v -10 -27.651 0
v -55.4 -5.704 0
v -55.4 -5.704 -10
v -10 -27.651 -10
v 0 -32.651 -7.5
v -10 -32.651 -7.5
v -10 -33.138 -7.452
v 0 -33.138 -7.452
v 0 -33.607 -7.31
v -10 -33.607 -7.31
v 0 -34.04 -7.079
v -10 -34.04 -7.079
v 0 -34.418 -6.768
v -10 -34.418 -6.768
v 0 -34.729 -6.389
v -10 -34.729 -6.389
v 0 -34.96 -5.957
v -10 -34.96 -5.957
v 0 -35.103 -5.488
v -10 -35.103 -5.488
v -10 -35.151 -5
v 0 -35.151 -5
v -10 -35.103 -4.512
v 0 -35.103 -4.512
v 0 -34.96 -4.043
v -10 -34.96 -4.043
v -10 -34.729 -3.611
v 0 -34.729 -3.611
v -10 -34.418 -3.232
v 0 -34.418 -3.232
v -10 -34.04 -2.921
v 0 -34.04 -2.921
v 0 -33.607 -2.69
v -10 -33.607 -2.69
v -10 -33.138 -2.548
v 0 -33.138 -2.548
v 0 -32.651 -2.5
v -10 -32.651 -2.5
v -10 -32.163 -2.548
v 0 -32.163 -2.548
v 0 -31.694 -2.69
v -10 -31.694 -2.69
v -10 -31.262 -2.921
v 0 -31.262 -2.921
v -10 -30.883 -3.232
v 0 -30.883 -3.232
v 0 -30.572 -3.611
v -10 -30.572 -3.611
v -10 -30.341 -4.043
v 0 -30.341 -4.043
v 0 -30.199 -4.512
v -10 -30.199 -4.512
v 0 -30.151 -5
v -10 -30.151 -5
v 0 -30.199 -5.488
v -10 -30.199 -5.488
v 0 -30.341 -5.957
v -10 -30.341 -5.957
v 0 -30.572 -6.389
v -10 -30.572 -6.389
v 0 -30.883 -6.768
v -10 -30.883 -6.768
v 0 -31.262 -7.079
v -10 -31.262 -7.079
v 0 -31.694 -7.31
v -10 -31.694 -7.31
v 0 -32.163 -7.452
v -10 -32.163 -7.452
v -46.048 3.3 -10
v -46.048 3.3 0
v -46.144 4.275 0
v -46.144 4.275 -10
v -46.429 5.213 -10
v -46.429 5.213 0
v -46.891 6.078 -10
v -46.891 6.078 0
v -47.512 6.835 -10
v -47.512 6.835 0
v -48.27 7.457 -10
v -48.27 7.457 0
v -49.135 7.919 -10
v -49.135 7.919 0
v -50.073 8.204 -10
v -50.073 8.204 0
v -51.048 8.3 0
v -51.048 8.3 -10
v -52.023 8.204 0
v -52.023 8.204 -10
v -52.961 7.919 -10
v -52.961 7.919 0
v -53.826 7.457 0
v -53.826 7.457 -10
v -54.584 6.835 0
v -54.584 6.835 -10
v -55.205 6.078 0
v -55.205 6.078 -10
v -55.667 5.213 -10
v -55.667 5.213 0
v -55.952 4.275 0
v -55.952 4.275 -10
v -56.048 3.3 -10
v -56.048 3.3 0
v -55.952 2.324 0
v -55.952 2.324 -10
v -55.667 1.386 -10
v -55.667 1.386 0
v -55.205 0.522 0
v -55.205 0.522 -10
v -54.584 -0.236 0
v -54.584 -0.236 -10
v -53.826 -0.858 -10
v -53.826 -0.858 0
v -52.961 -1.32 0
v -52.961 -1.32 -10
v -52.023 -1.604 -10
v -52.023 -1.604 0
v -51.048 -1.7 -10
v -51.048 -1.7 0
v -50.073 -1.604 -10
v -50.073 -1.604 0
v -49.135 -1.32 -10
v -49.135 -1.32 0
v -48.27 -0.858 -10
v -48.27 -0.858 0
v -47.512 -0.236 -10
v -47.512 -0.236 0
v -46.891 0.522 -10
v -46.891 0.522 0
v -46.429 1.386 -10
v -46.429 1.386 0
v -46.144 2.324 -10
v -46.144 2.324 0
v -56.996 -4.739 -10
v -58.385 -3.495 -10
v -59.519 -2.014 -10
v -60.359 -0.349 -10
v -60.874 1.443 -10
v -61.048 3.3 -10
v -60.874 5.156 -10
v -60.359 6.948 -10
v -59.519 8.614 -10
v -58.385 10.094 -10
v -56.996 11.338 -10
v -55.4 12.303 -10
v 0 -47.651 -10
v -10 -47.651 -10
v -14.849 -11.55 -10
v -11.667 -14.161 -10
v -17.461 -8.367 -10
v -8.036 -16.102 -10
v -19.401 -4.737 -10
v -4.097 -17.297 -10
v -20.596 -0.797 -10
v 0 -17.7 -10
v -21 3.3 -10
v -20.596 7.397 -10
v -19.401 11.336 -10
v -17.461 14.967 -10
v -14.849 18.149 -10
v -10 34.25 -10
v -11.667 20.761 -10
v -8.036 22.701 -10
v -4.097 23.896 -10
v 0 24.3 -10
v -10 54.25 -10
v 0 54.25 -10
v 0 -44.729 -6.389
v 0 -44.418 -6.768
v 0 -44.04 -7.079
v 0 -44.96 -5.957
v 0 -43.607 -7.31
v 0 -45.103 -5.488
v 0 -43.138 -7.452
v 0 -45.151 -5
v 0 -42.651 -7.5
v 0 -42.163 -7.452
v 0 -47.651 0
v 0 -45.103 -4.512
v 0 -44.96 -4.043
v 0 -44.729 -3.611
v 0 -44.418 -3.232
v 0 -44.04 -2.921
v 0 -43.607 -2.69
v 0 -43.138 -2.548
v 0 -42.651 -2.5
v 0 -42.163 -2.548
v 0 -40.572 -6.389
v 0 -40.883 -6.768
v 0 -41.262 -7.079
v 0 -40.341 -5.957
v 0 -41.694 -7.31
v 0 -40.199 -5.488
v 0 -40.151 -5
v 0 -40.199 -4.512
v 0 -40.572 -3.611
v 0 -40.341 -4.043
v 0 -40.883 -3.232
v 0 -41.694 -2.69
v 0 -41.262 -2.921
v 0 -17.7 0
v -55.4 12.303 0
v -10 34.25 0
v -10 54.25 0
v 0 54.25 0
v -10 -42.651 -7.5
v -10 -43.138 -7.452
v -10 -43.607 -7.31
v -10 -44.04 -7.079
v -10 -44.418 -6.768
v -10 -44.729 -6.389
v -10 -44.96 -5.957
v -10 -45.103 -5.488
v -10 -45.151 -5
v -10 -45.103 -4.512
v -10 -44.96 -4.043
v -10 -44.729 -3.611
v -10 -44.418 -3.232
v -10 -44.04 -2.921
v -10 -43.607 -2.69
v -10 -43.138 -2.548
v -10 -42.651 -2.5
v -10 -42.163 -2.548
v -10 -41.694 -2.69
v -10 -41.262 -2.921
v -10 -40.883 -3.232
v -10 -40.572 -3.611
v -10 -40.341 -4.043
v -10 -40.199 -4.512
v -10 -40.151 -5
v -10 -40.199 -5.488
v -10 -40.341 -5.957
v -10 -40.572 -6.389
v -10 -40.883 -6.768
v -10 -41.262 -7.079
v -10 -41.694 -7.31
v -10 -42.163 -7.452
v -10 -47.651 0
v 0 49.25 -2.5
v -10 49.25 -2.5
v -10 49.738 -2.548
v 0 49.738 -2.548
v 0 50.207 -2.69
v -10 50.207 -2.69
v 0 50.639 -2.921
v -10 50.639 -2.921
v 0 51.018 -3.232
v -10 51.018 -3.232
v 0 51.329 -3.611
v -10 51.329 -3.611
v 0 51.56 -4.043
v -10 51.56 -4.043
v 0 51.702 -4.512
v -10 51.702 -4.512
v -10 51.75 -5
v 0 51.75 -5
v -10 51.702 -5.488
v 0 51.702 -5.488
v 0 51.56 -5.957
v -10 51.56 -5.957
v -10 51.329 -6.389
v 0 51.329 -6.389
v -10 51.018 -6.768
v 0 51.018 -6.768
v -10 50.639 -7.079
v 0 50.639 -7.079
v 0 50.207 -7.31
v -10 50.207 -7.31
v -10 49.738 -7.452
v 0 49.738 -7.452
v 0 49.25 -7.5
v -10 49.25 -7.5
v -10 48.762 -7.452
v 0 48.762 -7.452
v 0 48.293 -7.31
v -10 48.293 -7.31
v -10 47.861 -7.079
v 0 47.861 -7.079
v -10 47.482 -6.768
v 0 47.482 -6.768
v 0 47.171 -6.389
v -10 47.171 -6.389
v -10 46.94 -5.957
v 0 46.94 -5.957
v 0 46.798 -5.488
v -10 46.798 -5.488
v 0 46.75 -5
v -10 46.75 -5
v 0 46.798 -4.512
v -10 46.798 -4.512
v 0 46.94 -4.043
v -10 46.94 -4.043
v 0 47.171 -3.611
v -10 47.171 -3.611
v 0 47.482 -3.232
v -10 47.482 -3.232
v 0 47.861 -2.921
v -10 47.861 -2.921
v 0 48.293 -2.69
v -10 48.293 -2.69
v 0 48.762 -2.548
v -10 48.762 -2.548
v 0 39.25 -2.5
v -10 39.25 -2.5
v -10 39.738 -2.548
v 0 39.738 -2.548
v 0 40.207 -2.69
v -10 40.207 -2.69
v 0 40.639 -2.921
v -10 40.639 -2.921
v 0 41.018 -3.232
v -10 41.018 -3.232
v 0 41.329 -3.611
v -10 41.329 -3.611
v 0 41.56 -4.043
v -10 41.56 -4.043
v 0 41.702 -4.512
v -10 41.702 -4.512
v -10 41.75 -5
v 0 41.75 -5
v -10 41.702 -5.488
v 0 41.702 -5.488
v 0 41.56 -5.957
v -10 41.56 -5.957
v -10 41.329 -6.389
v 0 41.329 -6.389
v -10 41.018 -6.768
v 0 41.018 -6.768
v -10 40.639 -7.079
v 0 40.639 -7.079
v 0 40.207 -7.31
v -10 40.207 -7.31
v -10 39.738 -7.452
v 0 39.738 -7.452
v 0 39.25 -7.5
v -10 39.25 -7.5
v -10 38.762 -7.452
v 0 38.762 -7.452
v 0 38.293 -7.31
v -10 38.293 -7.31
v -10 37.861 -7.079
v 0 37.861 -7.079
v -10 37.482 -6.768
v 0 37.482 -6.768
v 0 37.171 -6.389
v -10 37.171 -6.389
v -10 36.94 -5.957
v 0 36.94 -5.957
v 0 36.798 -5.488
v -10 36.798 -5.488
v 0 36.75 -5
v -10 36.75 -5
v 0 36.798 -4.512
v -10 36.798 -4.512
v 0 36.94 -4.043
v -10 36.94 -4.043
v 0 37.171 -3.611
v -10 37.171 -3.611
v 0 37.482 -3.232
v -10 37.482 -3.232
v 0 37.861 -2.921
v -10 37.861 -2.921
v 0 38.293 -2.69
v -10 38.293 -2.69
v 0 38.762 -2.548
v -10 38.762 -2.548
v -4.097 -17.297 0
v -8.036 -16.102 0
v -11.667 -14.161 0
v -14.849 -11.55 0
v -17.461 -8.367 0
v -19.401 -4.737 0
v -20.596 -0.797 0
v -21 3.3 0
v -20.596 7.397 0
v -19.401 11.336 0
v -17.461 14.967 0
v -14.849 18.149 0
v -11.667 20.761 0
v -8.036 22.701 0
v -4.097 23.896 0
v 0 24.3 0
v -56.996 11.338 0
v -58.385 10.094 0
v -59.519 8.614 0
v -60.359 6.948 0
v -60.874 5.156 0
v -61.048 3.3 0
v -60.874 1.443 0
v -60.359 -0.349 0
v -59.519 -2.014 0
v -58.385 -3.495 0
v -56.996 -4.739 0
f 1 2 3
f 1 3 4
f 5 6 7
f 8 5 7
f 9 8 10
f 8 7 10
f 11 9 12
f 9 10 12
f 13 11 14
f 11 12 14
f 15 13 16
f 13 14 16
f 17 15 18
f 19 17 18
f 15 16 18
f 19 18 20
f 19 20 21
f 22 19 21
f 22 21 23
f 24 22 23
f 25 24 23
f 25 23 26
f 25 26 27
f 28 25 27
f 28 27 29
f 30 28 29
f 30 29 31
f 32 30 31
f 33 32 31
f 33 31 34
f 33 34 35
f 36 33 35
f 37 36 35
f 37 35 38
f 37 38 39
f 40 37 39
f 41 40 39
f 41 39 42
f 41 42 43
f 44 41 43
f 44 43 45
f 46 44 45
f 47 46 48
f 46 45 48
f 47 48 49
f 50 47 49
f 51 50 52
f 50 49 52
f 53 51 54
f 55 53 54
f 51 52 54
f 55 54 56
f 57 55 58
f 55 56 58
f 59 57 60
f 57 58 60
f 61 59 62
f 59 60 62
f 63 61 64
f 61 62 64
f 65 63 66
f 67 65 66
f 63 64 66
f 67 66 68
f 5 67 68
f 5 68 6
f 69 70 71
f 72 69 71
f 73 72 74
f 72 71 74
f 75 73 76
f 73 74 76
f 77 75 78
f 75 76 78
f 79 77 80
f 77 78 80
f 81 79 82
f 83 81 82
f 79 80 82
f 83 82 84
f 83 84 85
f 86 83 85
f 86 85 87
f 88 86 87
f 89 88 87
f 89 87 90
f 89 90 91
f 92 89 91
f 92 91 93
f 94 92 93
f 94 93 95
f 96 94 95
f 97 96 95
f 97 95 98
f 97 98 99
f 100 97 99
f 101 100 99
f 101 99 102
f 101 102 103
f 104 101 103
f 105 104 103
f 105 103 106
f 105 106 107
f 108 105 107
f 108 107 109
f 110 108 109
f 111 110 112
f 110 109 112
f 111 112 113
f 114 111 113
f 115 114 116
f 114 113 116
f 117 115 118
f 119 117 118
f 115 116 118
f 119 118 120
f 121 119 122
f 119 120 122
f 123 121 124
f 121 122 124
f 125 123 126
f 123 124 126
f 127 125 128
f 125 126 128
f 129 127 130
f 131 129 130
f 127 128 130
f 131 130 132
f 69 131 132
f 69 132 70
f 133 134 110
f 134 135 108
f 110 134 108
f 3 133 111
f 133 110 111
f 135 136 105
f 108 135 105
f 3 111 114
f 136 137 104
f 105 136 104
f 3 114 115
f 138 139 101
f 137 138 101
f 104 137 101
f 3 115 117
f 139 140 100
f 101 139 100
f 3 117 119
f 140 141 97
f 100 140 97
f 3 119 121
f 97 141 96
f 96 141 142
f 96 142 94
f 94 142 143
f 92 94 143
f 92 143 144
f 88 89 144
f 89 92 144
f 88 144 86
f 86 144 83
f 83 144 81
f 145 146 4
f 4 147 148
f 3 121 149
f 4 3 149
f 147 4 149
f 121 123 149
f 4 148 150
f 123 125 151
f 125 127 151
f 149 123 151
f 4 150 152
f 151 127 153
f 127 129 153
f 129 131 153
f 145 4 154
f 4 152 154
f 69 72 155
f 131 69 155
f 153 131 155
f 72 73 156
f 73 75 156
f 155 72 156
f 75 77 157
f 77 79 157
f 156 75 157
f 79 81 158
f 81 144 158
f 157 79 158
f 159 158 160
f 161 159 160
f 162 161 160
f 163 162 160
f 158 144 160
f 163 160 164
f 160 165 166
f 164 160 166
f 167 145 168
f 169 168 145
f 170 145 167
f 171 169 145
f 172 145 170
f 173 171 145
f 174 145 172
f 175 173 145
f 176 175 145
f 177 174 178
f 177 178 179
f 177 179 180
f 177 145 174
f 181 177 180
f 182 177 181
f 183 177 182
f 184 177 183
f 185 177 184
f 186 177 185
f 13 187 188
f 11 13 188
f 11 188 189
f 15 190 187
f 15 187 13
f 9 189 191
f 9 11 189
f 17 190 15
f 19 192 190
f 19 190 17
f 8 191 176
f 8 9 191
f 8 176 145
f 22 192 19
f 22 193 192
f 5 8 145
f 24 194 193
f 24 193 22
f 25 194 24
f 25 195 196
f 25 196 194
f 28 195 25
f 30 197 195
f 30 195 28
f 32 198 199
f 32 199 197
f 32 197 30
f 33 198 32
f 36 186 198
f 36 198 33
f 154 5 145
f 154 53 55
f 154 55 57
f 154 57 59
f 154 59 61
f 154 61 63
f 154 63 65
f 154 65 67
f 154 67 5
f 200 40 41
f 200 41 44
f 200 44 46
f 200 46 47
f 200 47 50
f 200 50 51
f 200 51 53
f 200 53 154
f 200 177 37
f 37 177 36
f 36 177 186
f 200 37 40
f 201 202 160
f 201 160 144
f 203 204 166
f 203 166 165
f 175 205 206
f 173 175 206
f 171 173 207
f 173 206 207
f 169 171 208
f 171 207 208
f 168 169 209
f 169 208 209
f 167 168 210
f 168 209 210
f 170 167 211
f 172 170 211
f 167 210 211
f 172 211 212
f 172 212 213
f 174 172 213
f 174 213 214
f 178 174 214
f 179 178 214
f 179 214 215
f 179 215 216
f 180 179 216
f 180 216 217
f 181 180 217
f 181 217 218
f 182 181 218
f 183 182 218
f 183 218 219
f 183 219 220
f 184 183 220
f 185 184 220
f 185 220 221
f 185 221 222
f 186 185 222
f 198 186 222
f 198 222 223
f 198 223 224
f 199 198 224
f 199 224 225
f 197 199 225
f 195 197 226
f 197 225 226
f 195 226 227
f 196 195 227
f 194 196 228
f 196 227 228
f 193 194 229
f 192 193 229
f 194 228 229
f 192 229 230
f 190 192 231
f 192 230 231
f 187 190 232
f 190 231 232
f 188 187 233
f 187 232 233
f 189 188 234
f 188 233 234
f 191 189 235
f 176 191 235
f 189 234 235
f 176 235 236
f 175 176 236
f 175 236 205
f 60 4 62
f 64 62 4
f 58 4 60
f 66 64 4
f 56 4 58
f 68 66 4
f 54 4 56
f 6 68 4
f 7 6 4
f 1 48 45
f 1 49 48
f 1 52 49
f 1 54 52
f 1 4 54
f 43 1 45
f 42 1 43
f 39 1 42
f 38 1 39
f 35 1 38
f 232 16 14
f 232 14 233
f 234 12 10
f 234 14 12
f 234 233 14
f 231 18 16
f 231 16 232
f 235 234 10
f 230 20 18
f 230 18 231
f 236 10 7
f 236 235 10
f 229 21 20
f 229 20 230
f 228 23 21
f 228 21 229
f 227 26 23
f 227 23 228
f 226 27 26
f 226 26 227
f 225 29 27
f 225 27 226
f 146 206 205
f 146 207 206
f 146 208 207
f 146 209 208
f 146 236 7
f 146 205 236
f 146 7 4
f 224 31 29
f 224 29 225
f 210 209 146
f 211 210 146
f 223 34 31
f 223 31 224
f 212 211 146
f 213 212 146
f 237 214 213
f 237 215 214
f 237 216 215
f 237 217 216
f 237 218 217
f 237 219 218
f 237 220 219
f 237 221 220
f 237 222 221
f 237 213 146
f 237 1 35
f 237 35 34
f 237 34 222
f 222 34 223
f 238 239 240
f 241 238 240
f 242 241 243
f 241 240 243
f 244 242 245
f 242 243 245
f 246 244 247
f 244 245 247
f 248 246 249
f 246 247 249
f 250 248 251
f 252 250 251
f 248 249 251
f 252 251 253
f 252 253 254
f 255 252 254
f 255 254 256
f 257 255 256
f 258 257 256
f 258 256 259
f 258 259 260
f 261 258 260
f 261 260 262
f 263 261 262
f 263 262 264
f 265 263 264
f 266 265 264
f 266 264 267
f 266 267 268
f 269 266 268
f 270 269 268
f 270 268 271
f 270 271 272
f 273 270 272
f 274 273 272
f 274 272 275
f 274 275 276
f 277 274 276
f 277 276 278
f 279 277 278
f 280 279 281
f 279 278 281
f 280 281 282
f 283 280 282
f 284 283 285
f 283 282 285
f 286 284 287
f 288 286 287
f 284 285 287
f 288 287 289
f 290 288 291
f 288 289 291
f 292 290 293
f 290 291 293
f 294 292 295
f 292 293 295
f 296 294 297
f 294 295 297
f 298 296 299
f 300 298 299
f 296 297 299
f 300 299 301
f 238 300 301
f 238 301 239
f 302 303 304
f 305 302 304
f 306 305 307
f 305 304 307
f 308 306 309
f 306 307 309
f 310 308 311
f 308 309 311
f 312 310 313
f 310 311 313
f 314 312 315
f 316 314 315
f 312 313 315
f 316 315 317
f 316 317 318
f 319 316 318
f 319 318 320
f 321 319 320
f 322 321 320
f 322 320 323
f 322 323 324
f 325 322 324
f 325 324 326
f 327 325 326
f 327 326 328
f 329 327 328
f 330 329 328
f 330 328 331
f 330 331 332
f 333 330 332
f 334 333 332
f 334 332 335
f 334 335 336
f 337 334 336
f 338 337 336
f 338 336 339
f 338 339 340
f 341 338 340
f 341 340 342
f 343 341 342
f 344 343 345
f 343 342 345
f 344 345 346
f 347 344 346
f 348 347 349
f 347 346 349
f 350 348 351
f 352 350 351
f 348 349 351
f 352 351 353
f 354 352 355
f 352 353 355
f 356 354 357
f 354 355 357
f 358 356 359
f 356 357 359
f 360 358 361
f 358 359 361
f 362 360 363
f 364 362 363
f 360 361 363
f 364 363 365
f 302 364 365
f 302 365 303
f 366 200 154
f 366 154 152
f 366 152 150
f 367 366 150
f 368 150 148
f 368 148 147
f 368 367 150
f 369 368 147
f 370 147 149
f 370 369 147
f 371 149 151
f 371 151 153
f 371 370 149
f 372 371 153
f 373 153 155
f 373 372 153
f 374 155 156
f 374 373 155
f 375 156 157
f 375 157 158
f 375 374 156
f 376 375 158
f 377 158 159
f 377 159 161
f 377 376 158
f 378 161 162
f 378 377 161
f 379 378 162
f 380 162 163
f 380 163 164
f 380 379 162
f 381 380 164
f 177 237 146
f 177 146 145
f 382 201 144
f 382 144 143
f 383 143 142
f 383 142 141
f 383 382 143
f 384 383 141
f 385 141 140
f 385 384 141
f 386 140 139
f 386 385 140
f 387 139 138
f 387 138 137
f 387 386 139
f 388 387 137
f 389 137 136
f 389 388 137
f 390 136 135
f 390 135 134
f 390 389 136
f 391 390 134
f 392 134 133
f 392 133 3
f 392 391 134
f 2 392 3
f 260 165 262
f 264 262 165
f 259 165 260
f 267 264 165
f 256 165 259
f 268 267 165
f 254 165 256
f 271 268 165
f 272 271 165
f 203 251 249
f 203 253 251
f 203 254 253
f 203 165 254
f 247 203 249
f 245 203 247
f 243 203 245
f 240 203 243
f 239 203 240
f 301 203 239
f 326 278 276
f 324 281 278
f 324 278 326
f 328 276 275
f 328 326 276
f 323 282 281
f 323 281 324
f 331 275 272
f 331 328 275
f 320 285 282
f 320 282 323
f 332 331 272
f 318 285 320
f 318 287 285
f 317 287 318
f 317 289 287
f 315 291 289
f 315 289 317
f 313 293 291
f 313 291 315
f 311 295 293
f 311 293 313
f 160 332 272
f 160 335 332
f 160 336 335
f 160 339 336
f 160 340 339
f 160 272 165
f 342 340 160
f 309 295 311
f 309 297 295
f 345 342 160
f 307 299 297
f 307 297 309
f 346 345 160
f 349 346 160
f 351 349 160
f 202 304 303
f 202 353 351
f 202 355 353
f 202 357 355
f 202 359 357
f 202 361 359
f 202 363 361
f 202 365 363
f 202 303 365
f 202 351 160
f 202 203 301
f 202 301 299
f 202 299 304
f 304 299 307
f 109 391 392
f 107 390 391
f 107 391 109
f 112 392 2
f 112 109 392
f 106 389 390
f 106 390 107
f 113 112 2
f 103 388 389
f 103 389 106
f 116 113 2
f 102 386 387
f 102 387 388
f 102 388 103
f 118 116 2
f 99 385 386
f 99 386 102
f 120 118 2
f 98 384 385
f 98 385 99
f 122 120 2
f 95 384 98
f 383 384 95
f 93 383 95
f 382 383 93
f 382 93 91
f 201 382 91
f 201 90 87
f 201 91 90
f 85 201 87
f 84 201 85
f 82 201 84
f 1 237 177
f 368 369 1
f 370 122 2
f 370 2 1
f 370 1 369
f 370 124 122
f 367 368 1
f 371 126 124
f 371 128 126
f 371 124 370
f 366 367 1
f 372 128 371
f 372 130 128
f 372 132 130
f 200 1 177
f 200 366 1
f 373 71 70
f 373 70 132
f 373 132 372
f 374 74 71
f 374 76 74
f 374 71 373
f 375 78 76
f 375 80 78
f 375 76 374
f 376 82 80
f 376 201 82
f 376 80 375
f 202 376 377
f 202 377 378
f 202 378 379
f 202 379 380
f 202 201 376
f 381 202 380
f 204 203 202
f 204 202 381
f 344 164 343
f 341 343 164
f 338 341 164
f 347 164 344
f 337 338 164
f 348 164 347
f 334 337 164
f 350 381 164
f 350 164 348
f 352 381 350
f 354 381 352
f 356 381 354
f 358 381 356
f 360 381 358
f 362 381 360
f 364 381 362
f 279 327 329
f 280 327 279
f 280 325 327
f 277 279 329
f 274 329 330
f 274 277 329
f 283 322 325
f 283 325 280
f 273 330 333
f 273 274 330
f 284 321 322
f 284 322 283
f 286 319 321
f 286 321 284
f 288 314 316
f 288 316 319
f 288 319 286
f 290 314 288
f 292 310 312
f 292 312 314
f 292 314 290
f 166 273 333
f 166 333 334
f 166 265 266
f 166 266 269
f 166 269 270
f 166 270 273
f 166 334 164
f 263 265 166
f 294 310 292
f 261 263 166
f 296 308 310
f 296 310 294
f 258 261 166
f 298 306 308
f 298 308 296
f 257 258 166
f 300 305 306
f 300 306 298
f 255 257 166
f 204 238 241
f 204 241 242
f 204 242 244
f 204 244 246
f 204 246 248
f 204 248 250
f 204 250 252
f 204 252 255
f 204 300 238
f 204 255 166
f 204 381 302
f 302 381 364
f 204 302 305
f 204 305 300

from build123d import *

# Parameters (mm, degrees)
BOSS_EXTRUDE1_DEPTH = 10
SKETCH2_R           = 5
CUT_EXTRUDE1_DEPTH  = 83.27950738
SKETCH3_R           = 2.5
CUT_EXTRUDE2_DEPTH  = 76.159549646


with BuildPart() as part:
    # Sketch1 → Boss-Extrude1 (new body)
    with BuildSketch(Plane.XY):
        with BuildLine():
            Line((0, 24.299679487), (0, 54.25))
            Line((0, 54.25), (-10, 54.25))
            Line((-10, 54.25), (-10, 34.25))
            Line((-10, 34.25), (-55.400247003, 12.302884399))
            ThreePointArc((-55.400247003, 12.302884399), (-61.047971586, 3.299679487), (-55.400247003, -5.703525425))
            Line((-55.400247003, -5.703525425), (-10, -27.650641026))
            Line((-10, -27.650641026), (-10, -47.650641026))
            Line((-10, -47.650641026), (0, -47.650641026))
            Line((0, -47.650641026), (0, -17.700320513))
            ThreePointArc((0, -17.700320513), (-21, 3.299679487), (0, 24.299679487))
        make_face()
    extrude(amount=-BOSS_EXTRUDE1_DEPTH)

    # Sketch2 → Cut-Extrude1 (cut, through all)
    with BuildSketch(Plane.XY):
        with Locations((-51.047971586, 3.299679487)):
            Circle(SKETCH2_R)
    extrude(amount=-CUT_EXTRUDE1_DEPTH, mode=Mode.SUBTRACT)

    # Sketch3 → Cut-Extrude2 (cut, through all)
    with BuildSketch(Plane.ZY.offset(10)):
        with Locations((-5, 49.25)):
            Circle(SKETCH3_R)
        with Locations((-5, 39.25)):
            Circle(SKETCH3_R)
        with Locations(Location((-5, -32.650641026, 0), (0, 0, 180))):
            Circle(SKETCH3_R)
        with Locations(Location((-5, -42.650641026, 0), (0, 0, 180))):
            Circle(SKETCH3_R)
    extrude(amount=-CUT_EXTRUDE2_DEPTH, mode=Mode.SUBTRACT)


solid = part.part
